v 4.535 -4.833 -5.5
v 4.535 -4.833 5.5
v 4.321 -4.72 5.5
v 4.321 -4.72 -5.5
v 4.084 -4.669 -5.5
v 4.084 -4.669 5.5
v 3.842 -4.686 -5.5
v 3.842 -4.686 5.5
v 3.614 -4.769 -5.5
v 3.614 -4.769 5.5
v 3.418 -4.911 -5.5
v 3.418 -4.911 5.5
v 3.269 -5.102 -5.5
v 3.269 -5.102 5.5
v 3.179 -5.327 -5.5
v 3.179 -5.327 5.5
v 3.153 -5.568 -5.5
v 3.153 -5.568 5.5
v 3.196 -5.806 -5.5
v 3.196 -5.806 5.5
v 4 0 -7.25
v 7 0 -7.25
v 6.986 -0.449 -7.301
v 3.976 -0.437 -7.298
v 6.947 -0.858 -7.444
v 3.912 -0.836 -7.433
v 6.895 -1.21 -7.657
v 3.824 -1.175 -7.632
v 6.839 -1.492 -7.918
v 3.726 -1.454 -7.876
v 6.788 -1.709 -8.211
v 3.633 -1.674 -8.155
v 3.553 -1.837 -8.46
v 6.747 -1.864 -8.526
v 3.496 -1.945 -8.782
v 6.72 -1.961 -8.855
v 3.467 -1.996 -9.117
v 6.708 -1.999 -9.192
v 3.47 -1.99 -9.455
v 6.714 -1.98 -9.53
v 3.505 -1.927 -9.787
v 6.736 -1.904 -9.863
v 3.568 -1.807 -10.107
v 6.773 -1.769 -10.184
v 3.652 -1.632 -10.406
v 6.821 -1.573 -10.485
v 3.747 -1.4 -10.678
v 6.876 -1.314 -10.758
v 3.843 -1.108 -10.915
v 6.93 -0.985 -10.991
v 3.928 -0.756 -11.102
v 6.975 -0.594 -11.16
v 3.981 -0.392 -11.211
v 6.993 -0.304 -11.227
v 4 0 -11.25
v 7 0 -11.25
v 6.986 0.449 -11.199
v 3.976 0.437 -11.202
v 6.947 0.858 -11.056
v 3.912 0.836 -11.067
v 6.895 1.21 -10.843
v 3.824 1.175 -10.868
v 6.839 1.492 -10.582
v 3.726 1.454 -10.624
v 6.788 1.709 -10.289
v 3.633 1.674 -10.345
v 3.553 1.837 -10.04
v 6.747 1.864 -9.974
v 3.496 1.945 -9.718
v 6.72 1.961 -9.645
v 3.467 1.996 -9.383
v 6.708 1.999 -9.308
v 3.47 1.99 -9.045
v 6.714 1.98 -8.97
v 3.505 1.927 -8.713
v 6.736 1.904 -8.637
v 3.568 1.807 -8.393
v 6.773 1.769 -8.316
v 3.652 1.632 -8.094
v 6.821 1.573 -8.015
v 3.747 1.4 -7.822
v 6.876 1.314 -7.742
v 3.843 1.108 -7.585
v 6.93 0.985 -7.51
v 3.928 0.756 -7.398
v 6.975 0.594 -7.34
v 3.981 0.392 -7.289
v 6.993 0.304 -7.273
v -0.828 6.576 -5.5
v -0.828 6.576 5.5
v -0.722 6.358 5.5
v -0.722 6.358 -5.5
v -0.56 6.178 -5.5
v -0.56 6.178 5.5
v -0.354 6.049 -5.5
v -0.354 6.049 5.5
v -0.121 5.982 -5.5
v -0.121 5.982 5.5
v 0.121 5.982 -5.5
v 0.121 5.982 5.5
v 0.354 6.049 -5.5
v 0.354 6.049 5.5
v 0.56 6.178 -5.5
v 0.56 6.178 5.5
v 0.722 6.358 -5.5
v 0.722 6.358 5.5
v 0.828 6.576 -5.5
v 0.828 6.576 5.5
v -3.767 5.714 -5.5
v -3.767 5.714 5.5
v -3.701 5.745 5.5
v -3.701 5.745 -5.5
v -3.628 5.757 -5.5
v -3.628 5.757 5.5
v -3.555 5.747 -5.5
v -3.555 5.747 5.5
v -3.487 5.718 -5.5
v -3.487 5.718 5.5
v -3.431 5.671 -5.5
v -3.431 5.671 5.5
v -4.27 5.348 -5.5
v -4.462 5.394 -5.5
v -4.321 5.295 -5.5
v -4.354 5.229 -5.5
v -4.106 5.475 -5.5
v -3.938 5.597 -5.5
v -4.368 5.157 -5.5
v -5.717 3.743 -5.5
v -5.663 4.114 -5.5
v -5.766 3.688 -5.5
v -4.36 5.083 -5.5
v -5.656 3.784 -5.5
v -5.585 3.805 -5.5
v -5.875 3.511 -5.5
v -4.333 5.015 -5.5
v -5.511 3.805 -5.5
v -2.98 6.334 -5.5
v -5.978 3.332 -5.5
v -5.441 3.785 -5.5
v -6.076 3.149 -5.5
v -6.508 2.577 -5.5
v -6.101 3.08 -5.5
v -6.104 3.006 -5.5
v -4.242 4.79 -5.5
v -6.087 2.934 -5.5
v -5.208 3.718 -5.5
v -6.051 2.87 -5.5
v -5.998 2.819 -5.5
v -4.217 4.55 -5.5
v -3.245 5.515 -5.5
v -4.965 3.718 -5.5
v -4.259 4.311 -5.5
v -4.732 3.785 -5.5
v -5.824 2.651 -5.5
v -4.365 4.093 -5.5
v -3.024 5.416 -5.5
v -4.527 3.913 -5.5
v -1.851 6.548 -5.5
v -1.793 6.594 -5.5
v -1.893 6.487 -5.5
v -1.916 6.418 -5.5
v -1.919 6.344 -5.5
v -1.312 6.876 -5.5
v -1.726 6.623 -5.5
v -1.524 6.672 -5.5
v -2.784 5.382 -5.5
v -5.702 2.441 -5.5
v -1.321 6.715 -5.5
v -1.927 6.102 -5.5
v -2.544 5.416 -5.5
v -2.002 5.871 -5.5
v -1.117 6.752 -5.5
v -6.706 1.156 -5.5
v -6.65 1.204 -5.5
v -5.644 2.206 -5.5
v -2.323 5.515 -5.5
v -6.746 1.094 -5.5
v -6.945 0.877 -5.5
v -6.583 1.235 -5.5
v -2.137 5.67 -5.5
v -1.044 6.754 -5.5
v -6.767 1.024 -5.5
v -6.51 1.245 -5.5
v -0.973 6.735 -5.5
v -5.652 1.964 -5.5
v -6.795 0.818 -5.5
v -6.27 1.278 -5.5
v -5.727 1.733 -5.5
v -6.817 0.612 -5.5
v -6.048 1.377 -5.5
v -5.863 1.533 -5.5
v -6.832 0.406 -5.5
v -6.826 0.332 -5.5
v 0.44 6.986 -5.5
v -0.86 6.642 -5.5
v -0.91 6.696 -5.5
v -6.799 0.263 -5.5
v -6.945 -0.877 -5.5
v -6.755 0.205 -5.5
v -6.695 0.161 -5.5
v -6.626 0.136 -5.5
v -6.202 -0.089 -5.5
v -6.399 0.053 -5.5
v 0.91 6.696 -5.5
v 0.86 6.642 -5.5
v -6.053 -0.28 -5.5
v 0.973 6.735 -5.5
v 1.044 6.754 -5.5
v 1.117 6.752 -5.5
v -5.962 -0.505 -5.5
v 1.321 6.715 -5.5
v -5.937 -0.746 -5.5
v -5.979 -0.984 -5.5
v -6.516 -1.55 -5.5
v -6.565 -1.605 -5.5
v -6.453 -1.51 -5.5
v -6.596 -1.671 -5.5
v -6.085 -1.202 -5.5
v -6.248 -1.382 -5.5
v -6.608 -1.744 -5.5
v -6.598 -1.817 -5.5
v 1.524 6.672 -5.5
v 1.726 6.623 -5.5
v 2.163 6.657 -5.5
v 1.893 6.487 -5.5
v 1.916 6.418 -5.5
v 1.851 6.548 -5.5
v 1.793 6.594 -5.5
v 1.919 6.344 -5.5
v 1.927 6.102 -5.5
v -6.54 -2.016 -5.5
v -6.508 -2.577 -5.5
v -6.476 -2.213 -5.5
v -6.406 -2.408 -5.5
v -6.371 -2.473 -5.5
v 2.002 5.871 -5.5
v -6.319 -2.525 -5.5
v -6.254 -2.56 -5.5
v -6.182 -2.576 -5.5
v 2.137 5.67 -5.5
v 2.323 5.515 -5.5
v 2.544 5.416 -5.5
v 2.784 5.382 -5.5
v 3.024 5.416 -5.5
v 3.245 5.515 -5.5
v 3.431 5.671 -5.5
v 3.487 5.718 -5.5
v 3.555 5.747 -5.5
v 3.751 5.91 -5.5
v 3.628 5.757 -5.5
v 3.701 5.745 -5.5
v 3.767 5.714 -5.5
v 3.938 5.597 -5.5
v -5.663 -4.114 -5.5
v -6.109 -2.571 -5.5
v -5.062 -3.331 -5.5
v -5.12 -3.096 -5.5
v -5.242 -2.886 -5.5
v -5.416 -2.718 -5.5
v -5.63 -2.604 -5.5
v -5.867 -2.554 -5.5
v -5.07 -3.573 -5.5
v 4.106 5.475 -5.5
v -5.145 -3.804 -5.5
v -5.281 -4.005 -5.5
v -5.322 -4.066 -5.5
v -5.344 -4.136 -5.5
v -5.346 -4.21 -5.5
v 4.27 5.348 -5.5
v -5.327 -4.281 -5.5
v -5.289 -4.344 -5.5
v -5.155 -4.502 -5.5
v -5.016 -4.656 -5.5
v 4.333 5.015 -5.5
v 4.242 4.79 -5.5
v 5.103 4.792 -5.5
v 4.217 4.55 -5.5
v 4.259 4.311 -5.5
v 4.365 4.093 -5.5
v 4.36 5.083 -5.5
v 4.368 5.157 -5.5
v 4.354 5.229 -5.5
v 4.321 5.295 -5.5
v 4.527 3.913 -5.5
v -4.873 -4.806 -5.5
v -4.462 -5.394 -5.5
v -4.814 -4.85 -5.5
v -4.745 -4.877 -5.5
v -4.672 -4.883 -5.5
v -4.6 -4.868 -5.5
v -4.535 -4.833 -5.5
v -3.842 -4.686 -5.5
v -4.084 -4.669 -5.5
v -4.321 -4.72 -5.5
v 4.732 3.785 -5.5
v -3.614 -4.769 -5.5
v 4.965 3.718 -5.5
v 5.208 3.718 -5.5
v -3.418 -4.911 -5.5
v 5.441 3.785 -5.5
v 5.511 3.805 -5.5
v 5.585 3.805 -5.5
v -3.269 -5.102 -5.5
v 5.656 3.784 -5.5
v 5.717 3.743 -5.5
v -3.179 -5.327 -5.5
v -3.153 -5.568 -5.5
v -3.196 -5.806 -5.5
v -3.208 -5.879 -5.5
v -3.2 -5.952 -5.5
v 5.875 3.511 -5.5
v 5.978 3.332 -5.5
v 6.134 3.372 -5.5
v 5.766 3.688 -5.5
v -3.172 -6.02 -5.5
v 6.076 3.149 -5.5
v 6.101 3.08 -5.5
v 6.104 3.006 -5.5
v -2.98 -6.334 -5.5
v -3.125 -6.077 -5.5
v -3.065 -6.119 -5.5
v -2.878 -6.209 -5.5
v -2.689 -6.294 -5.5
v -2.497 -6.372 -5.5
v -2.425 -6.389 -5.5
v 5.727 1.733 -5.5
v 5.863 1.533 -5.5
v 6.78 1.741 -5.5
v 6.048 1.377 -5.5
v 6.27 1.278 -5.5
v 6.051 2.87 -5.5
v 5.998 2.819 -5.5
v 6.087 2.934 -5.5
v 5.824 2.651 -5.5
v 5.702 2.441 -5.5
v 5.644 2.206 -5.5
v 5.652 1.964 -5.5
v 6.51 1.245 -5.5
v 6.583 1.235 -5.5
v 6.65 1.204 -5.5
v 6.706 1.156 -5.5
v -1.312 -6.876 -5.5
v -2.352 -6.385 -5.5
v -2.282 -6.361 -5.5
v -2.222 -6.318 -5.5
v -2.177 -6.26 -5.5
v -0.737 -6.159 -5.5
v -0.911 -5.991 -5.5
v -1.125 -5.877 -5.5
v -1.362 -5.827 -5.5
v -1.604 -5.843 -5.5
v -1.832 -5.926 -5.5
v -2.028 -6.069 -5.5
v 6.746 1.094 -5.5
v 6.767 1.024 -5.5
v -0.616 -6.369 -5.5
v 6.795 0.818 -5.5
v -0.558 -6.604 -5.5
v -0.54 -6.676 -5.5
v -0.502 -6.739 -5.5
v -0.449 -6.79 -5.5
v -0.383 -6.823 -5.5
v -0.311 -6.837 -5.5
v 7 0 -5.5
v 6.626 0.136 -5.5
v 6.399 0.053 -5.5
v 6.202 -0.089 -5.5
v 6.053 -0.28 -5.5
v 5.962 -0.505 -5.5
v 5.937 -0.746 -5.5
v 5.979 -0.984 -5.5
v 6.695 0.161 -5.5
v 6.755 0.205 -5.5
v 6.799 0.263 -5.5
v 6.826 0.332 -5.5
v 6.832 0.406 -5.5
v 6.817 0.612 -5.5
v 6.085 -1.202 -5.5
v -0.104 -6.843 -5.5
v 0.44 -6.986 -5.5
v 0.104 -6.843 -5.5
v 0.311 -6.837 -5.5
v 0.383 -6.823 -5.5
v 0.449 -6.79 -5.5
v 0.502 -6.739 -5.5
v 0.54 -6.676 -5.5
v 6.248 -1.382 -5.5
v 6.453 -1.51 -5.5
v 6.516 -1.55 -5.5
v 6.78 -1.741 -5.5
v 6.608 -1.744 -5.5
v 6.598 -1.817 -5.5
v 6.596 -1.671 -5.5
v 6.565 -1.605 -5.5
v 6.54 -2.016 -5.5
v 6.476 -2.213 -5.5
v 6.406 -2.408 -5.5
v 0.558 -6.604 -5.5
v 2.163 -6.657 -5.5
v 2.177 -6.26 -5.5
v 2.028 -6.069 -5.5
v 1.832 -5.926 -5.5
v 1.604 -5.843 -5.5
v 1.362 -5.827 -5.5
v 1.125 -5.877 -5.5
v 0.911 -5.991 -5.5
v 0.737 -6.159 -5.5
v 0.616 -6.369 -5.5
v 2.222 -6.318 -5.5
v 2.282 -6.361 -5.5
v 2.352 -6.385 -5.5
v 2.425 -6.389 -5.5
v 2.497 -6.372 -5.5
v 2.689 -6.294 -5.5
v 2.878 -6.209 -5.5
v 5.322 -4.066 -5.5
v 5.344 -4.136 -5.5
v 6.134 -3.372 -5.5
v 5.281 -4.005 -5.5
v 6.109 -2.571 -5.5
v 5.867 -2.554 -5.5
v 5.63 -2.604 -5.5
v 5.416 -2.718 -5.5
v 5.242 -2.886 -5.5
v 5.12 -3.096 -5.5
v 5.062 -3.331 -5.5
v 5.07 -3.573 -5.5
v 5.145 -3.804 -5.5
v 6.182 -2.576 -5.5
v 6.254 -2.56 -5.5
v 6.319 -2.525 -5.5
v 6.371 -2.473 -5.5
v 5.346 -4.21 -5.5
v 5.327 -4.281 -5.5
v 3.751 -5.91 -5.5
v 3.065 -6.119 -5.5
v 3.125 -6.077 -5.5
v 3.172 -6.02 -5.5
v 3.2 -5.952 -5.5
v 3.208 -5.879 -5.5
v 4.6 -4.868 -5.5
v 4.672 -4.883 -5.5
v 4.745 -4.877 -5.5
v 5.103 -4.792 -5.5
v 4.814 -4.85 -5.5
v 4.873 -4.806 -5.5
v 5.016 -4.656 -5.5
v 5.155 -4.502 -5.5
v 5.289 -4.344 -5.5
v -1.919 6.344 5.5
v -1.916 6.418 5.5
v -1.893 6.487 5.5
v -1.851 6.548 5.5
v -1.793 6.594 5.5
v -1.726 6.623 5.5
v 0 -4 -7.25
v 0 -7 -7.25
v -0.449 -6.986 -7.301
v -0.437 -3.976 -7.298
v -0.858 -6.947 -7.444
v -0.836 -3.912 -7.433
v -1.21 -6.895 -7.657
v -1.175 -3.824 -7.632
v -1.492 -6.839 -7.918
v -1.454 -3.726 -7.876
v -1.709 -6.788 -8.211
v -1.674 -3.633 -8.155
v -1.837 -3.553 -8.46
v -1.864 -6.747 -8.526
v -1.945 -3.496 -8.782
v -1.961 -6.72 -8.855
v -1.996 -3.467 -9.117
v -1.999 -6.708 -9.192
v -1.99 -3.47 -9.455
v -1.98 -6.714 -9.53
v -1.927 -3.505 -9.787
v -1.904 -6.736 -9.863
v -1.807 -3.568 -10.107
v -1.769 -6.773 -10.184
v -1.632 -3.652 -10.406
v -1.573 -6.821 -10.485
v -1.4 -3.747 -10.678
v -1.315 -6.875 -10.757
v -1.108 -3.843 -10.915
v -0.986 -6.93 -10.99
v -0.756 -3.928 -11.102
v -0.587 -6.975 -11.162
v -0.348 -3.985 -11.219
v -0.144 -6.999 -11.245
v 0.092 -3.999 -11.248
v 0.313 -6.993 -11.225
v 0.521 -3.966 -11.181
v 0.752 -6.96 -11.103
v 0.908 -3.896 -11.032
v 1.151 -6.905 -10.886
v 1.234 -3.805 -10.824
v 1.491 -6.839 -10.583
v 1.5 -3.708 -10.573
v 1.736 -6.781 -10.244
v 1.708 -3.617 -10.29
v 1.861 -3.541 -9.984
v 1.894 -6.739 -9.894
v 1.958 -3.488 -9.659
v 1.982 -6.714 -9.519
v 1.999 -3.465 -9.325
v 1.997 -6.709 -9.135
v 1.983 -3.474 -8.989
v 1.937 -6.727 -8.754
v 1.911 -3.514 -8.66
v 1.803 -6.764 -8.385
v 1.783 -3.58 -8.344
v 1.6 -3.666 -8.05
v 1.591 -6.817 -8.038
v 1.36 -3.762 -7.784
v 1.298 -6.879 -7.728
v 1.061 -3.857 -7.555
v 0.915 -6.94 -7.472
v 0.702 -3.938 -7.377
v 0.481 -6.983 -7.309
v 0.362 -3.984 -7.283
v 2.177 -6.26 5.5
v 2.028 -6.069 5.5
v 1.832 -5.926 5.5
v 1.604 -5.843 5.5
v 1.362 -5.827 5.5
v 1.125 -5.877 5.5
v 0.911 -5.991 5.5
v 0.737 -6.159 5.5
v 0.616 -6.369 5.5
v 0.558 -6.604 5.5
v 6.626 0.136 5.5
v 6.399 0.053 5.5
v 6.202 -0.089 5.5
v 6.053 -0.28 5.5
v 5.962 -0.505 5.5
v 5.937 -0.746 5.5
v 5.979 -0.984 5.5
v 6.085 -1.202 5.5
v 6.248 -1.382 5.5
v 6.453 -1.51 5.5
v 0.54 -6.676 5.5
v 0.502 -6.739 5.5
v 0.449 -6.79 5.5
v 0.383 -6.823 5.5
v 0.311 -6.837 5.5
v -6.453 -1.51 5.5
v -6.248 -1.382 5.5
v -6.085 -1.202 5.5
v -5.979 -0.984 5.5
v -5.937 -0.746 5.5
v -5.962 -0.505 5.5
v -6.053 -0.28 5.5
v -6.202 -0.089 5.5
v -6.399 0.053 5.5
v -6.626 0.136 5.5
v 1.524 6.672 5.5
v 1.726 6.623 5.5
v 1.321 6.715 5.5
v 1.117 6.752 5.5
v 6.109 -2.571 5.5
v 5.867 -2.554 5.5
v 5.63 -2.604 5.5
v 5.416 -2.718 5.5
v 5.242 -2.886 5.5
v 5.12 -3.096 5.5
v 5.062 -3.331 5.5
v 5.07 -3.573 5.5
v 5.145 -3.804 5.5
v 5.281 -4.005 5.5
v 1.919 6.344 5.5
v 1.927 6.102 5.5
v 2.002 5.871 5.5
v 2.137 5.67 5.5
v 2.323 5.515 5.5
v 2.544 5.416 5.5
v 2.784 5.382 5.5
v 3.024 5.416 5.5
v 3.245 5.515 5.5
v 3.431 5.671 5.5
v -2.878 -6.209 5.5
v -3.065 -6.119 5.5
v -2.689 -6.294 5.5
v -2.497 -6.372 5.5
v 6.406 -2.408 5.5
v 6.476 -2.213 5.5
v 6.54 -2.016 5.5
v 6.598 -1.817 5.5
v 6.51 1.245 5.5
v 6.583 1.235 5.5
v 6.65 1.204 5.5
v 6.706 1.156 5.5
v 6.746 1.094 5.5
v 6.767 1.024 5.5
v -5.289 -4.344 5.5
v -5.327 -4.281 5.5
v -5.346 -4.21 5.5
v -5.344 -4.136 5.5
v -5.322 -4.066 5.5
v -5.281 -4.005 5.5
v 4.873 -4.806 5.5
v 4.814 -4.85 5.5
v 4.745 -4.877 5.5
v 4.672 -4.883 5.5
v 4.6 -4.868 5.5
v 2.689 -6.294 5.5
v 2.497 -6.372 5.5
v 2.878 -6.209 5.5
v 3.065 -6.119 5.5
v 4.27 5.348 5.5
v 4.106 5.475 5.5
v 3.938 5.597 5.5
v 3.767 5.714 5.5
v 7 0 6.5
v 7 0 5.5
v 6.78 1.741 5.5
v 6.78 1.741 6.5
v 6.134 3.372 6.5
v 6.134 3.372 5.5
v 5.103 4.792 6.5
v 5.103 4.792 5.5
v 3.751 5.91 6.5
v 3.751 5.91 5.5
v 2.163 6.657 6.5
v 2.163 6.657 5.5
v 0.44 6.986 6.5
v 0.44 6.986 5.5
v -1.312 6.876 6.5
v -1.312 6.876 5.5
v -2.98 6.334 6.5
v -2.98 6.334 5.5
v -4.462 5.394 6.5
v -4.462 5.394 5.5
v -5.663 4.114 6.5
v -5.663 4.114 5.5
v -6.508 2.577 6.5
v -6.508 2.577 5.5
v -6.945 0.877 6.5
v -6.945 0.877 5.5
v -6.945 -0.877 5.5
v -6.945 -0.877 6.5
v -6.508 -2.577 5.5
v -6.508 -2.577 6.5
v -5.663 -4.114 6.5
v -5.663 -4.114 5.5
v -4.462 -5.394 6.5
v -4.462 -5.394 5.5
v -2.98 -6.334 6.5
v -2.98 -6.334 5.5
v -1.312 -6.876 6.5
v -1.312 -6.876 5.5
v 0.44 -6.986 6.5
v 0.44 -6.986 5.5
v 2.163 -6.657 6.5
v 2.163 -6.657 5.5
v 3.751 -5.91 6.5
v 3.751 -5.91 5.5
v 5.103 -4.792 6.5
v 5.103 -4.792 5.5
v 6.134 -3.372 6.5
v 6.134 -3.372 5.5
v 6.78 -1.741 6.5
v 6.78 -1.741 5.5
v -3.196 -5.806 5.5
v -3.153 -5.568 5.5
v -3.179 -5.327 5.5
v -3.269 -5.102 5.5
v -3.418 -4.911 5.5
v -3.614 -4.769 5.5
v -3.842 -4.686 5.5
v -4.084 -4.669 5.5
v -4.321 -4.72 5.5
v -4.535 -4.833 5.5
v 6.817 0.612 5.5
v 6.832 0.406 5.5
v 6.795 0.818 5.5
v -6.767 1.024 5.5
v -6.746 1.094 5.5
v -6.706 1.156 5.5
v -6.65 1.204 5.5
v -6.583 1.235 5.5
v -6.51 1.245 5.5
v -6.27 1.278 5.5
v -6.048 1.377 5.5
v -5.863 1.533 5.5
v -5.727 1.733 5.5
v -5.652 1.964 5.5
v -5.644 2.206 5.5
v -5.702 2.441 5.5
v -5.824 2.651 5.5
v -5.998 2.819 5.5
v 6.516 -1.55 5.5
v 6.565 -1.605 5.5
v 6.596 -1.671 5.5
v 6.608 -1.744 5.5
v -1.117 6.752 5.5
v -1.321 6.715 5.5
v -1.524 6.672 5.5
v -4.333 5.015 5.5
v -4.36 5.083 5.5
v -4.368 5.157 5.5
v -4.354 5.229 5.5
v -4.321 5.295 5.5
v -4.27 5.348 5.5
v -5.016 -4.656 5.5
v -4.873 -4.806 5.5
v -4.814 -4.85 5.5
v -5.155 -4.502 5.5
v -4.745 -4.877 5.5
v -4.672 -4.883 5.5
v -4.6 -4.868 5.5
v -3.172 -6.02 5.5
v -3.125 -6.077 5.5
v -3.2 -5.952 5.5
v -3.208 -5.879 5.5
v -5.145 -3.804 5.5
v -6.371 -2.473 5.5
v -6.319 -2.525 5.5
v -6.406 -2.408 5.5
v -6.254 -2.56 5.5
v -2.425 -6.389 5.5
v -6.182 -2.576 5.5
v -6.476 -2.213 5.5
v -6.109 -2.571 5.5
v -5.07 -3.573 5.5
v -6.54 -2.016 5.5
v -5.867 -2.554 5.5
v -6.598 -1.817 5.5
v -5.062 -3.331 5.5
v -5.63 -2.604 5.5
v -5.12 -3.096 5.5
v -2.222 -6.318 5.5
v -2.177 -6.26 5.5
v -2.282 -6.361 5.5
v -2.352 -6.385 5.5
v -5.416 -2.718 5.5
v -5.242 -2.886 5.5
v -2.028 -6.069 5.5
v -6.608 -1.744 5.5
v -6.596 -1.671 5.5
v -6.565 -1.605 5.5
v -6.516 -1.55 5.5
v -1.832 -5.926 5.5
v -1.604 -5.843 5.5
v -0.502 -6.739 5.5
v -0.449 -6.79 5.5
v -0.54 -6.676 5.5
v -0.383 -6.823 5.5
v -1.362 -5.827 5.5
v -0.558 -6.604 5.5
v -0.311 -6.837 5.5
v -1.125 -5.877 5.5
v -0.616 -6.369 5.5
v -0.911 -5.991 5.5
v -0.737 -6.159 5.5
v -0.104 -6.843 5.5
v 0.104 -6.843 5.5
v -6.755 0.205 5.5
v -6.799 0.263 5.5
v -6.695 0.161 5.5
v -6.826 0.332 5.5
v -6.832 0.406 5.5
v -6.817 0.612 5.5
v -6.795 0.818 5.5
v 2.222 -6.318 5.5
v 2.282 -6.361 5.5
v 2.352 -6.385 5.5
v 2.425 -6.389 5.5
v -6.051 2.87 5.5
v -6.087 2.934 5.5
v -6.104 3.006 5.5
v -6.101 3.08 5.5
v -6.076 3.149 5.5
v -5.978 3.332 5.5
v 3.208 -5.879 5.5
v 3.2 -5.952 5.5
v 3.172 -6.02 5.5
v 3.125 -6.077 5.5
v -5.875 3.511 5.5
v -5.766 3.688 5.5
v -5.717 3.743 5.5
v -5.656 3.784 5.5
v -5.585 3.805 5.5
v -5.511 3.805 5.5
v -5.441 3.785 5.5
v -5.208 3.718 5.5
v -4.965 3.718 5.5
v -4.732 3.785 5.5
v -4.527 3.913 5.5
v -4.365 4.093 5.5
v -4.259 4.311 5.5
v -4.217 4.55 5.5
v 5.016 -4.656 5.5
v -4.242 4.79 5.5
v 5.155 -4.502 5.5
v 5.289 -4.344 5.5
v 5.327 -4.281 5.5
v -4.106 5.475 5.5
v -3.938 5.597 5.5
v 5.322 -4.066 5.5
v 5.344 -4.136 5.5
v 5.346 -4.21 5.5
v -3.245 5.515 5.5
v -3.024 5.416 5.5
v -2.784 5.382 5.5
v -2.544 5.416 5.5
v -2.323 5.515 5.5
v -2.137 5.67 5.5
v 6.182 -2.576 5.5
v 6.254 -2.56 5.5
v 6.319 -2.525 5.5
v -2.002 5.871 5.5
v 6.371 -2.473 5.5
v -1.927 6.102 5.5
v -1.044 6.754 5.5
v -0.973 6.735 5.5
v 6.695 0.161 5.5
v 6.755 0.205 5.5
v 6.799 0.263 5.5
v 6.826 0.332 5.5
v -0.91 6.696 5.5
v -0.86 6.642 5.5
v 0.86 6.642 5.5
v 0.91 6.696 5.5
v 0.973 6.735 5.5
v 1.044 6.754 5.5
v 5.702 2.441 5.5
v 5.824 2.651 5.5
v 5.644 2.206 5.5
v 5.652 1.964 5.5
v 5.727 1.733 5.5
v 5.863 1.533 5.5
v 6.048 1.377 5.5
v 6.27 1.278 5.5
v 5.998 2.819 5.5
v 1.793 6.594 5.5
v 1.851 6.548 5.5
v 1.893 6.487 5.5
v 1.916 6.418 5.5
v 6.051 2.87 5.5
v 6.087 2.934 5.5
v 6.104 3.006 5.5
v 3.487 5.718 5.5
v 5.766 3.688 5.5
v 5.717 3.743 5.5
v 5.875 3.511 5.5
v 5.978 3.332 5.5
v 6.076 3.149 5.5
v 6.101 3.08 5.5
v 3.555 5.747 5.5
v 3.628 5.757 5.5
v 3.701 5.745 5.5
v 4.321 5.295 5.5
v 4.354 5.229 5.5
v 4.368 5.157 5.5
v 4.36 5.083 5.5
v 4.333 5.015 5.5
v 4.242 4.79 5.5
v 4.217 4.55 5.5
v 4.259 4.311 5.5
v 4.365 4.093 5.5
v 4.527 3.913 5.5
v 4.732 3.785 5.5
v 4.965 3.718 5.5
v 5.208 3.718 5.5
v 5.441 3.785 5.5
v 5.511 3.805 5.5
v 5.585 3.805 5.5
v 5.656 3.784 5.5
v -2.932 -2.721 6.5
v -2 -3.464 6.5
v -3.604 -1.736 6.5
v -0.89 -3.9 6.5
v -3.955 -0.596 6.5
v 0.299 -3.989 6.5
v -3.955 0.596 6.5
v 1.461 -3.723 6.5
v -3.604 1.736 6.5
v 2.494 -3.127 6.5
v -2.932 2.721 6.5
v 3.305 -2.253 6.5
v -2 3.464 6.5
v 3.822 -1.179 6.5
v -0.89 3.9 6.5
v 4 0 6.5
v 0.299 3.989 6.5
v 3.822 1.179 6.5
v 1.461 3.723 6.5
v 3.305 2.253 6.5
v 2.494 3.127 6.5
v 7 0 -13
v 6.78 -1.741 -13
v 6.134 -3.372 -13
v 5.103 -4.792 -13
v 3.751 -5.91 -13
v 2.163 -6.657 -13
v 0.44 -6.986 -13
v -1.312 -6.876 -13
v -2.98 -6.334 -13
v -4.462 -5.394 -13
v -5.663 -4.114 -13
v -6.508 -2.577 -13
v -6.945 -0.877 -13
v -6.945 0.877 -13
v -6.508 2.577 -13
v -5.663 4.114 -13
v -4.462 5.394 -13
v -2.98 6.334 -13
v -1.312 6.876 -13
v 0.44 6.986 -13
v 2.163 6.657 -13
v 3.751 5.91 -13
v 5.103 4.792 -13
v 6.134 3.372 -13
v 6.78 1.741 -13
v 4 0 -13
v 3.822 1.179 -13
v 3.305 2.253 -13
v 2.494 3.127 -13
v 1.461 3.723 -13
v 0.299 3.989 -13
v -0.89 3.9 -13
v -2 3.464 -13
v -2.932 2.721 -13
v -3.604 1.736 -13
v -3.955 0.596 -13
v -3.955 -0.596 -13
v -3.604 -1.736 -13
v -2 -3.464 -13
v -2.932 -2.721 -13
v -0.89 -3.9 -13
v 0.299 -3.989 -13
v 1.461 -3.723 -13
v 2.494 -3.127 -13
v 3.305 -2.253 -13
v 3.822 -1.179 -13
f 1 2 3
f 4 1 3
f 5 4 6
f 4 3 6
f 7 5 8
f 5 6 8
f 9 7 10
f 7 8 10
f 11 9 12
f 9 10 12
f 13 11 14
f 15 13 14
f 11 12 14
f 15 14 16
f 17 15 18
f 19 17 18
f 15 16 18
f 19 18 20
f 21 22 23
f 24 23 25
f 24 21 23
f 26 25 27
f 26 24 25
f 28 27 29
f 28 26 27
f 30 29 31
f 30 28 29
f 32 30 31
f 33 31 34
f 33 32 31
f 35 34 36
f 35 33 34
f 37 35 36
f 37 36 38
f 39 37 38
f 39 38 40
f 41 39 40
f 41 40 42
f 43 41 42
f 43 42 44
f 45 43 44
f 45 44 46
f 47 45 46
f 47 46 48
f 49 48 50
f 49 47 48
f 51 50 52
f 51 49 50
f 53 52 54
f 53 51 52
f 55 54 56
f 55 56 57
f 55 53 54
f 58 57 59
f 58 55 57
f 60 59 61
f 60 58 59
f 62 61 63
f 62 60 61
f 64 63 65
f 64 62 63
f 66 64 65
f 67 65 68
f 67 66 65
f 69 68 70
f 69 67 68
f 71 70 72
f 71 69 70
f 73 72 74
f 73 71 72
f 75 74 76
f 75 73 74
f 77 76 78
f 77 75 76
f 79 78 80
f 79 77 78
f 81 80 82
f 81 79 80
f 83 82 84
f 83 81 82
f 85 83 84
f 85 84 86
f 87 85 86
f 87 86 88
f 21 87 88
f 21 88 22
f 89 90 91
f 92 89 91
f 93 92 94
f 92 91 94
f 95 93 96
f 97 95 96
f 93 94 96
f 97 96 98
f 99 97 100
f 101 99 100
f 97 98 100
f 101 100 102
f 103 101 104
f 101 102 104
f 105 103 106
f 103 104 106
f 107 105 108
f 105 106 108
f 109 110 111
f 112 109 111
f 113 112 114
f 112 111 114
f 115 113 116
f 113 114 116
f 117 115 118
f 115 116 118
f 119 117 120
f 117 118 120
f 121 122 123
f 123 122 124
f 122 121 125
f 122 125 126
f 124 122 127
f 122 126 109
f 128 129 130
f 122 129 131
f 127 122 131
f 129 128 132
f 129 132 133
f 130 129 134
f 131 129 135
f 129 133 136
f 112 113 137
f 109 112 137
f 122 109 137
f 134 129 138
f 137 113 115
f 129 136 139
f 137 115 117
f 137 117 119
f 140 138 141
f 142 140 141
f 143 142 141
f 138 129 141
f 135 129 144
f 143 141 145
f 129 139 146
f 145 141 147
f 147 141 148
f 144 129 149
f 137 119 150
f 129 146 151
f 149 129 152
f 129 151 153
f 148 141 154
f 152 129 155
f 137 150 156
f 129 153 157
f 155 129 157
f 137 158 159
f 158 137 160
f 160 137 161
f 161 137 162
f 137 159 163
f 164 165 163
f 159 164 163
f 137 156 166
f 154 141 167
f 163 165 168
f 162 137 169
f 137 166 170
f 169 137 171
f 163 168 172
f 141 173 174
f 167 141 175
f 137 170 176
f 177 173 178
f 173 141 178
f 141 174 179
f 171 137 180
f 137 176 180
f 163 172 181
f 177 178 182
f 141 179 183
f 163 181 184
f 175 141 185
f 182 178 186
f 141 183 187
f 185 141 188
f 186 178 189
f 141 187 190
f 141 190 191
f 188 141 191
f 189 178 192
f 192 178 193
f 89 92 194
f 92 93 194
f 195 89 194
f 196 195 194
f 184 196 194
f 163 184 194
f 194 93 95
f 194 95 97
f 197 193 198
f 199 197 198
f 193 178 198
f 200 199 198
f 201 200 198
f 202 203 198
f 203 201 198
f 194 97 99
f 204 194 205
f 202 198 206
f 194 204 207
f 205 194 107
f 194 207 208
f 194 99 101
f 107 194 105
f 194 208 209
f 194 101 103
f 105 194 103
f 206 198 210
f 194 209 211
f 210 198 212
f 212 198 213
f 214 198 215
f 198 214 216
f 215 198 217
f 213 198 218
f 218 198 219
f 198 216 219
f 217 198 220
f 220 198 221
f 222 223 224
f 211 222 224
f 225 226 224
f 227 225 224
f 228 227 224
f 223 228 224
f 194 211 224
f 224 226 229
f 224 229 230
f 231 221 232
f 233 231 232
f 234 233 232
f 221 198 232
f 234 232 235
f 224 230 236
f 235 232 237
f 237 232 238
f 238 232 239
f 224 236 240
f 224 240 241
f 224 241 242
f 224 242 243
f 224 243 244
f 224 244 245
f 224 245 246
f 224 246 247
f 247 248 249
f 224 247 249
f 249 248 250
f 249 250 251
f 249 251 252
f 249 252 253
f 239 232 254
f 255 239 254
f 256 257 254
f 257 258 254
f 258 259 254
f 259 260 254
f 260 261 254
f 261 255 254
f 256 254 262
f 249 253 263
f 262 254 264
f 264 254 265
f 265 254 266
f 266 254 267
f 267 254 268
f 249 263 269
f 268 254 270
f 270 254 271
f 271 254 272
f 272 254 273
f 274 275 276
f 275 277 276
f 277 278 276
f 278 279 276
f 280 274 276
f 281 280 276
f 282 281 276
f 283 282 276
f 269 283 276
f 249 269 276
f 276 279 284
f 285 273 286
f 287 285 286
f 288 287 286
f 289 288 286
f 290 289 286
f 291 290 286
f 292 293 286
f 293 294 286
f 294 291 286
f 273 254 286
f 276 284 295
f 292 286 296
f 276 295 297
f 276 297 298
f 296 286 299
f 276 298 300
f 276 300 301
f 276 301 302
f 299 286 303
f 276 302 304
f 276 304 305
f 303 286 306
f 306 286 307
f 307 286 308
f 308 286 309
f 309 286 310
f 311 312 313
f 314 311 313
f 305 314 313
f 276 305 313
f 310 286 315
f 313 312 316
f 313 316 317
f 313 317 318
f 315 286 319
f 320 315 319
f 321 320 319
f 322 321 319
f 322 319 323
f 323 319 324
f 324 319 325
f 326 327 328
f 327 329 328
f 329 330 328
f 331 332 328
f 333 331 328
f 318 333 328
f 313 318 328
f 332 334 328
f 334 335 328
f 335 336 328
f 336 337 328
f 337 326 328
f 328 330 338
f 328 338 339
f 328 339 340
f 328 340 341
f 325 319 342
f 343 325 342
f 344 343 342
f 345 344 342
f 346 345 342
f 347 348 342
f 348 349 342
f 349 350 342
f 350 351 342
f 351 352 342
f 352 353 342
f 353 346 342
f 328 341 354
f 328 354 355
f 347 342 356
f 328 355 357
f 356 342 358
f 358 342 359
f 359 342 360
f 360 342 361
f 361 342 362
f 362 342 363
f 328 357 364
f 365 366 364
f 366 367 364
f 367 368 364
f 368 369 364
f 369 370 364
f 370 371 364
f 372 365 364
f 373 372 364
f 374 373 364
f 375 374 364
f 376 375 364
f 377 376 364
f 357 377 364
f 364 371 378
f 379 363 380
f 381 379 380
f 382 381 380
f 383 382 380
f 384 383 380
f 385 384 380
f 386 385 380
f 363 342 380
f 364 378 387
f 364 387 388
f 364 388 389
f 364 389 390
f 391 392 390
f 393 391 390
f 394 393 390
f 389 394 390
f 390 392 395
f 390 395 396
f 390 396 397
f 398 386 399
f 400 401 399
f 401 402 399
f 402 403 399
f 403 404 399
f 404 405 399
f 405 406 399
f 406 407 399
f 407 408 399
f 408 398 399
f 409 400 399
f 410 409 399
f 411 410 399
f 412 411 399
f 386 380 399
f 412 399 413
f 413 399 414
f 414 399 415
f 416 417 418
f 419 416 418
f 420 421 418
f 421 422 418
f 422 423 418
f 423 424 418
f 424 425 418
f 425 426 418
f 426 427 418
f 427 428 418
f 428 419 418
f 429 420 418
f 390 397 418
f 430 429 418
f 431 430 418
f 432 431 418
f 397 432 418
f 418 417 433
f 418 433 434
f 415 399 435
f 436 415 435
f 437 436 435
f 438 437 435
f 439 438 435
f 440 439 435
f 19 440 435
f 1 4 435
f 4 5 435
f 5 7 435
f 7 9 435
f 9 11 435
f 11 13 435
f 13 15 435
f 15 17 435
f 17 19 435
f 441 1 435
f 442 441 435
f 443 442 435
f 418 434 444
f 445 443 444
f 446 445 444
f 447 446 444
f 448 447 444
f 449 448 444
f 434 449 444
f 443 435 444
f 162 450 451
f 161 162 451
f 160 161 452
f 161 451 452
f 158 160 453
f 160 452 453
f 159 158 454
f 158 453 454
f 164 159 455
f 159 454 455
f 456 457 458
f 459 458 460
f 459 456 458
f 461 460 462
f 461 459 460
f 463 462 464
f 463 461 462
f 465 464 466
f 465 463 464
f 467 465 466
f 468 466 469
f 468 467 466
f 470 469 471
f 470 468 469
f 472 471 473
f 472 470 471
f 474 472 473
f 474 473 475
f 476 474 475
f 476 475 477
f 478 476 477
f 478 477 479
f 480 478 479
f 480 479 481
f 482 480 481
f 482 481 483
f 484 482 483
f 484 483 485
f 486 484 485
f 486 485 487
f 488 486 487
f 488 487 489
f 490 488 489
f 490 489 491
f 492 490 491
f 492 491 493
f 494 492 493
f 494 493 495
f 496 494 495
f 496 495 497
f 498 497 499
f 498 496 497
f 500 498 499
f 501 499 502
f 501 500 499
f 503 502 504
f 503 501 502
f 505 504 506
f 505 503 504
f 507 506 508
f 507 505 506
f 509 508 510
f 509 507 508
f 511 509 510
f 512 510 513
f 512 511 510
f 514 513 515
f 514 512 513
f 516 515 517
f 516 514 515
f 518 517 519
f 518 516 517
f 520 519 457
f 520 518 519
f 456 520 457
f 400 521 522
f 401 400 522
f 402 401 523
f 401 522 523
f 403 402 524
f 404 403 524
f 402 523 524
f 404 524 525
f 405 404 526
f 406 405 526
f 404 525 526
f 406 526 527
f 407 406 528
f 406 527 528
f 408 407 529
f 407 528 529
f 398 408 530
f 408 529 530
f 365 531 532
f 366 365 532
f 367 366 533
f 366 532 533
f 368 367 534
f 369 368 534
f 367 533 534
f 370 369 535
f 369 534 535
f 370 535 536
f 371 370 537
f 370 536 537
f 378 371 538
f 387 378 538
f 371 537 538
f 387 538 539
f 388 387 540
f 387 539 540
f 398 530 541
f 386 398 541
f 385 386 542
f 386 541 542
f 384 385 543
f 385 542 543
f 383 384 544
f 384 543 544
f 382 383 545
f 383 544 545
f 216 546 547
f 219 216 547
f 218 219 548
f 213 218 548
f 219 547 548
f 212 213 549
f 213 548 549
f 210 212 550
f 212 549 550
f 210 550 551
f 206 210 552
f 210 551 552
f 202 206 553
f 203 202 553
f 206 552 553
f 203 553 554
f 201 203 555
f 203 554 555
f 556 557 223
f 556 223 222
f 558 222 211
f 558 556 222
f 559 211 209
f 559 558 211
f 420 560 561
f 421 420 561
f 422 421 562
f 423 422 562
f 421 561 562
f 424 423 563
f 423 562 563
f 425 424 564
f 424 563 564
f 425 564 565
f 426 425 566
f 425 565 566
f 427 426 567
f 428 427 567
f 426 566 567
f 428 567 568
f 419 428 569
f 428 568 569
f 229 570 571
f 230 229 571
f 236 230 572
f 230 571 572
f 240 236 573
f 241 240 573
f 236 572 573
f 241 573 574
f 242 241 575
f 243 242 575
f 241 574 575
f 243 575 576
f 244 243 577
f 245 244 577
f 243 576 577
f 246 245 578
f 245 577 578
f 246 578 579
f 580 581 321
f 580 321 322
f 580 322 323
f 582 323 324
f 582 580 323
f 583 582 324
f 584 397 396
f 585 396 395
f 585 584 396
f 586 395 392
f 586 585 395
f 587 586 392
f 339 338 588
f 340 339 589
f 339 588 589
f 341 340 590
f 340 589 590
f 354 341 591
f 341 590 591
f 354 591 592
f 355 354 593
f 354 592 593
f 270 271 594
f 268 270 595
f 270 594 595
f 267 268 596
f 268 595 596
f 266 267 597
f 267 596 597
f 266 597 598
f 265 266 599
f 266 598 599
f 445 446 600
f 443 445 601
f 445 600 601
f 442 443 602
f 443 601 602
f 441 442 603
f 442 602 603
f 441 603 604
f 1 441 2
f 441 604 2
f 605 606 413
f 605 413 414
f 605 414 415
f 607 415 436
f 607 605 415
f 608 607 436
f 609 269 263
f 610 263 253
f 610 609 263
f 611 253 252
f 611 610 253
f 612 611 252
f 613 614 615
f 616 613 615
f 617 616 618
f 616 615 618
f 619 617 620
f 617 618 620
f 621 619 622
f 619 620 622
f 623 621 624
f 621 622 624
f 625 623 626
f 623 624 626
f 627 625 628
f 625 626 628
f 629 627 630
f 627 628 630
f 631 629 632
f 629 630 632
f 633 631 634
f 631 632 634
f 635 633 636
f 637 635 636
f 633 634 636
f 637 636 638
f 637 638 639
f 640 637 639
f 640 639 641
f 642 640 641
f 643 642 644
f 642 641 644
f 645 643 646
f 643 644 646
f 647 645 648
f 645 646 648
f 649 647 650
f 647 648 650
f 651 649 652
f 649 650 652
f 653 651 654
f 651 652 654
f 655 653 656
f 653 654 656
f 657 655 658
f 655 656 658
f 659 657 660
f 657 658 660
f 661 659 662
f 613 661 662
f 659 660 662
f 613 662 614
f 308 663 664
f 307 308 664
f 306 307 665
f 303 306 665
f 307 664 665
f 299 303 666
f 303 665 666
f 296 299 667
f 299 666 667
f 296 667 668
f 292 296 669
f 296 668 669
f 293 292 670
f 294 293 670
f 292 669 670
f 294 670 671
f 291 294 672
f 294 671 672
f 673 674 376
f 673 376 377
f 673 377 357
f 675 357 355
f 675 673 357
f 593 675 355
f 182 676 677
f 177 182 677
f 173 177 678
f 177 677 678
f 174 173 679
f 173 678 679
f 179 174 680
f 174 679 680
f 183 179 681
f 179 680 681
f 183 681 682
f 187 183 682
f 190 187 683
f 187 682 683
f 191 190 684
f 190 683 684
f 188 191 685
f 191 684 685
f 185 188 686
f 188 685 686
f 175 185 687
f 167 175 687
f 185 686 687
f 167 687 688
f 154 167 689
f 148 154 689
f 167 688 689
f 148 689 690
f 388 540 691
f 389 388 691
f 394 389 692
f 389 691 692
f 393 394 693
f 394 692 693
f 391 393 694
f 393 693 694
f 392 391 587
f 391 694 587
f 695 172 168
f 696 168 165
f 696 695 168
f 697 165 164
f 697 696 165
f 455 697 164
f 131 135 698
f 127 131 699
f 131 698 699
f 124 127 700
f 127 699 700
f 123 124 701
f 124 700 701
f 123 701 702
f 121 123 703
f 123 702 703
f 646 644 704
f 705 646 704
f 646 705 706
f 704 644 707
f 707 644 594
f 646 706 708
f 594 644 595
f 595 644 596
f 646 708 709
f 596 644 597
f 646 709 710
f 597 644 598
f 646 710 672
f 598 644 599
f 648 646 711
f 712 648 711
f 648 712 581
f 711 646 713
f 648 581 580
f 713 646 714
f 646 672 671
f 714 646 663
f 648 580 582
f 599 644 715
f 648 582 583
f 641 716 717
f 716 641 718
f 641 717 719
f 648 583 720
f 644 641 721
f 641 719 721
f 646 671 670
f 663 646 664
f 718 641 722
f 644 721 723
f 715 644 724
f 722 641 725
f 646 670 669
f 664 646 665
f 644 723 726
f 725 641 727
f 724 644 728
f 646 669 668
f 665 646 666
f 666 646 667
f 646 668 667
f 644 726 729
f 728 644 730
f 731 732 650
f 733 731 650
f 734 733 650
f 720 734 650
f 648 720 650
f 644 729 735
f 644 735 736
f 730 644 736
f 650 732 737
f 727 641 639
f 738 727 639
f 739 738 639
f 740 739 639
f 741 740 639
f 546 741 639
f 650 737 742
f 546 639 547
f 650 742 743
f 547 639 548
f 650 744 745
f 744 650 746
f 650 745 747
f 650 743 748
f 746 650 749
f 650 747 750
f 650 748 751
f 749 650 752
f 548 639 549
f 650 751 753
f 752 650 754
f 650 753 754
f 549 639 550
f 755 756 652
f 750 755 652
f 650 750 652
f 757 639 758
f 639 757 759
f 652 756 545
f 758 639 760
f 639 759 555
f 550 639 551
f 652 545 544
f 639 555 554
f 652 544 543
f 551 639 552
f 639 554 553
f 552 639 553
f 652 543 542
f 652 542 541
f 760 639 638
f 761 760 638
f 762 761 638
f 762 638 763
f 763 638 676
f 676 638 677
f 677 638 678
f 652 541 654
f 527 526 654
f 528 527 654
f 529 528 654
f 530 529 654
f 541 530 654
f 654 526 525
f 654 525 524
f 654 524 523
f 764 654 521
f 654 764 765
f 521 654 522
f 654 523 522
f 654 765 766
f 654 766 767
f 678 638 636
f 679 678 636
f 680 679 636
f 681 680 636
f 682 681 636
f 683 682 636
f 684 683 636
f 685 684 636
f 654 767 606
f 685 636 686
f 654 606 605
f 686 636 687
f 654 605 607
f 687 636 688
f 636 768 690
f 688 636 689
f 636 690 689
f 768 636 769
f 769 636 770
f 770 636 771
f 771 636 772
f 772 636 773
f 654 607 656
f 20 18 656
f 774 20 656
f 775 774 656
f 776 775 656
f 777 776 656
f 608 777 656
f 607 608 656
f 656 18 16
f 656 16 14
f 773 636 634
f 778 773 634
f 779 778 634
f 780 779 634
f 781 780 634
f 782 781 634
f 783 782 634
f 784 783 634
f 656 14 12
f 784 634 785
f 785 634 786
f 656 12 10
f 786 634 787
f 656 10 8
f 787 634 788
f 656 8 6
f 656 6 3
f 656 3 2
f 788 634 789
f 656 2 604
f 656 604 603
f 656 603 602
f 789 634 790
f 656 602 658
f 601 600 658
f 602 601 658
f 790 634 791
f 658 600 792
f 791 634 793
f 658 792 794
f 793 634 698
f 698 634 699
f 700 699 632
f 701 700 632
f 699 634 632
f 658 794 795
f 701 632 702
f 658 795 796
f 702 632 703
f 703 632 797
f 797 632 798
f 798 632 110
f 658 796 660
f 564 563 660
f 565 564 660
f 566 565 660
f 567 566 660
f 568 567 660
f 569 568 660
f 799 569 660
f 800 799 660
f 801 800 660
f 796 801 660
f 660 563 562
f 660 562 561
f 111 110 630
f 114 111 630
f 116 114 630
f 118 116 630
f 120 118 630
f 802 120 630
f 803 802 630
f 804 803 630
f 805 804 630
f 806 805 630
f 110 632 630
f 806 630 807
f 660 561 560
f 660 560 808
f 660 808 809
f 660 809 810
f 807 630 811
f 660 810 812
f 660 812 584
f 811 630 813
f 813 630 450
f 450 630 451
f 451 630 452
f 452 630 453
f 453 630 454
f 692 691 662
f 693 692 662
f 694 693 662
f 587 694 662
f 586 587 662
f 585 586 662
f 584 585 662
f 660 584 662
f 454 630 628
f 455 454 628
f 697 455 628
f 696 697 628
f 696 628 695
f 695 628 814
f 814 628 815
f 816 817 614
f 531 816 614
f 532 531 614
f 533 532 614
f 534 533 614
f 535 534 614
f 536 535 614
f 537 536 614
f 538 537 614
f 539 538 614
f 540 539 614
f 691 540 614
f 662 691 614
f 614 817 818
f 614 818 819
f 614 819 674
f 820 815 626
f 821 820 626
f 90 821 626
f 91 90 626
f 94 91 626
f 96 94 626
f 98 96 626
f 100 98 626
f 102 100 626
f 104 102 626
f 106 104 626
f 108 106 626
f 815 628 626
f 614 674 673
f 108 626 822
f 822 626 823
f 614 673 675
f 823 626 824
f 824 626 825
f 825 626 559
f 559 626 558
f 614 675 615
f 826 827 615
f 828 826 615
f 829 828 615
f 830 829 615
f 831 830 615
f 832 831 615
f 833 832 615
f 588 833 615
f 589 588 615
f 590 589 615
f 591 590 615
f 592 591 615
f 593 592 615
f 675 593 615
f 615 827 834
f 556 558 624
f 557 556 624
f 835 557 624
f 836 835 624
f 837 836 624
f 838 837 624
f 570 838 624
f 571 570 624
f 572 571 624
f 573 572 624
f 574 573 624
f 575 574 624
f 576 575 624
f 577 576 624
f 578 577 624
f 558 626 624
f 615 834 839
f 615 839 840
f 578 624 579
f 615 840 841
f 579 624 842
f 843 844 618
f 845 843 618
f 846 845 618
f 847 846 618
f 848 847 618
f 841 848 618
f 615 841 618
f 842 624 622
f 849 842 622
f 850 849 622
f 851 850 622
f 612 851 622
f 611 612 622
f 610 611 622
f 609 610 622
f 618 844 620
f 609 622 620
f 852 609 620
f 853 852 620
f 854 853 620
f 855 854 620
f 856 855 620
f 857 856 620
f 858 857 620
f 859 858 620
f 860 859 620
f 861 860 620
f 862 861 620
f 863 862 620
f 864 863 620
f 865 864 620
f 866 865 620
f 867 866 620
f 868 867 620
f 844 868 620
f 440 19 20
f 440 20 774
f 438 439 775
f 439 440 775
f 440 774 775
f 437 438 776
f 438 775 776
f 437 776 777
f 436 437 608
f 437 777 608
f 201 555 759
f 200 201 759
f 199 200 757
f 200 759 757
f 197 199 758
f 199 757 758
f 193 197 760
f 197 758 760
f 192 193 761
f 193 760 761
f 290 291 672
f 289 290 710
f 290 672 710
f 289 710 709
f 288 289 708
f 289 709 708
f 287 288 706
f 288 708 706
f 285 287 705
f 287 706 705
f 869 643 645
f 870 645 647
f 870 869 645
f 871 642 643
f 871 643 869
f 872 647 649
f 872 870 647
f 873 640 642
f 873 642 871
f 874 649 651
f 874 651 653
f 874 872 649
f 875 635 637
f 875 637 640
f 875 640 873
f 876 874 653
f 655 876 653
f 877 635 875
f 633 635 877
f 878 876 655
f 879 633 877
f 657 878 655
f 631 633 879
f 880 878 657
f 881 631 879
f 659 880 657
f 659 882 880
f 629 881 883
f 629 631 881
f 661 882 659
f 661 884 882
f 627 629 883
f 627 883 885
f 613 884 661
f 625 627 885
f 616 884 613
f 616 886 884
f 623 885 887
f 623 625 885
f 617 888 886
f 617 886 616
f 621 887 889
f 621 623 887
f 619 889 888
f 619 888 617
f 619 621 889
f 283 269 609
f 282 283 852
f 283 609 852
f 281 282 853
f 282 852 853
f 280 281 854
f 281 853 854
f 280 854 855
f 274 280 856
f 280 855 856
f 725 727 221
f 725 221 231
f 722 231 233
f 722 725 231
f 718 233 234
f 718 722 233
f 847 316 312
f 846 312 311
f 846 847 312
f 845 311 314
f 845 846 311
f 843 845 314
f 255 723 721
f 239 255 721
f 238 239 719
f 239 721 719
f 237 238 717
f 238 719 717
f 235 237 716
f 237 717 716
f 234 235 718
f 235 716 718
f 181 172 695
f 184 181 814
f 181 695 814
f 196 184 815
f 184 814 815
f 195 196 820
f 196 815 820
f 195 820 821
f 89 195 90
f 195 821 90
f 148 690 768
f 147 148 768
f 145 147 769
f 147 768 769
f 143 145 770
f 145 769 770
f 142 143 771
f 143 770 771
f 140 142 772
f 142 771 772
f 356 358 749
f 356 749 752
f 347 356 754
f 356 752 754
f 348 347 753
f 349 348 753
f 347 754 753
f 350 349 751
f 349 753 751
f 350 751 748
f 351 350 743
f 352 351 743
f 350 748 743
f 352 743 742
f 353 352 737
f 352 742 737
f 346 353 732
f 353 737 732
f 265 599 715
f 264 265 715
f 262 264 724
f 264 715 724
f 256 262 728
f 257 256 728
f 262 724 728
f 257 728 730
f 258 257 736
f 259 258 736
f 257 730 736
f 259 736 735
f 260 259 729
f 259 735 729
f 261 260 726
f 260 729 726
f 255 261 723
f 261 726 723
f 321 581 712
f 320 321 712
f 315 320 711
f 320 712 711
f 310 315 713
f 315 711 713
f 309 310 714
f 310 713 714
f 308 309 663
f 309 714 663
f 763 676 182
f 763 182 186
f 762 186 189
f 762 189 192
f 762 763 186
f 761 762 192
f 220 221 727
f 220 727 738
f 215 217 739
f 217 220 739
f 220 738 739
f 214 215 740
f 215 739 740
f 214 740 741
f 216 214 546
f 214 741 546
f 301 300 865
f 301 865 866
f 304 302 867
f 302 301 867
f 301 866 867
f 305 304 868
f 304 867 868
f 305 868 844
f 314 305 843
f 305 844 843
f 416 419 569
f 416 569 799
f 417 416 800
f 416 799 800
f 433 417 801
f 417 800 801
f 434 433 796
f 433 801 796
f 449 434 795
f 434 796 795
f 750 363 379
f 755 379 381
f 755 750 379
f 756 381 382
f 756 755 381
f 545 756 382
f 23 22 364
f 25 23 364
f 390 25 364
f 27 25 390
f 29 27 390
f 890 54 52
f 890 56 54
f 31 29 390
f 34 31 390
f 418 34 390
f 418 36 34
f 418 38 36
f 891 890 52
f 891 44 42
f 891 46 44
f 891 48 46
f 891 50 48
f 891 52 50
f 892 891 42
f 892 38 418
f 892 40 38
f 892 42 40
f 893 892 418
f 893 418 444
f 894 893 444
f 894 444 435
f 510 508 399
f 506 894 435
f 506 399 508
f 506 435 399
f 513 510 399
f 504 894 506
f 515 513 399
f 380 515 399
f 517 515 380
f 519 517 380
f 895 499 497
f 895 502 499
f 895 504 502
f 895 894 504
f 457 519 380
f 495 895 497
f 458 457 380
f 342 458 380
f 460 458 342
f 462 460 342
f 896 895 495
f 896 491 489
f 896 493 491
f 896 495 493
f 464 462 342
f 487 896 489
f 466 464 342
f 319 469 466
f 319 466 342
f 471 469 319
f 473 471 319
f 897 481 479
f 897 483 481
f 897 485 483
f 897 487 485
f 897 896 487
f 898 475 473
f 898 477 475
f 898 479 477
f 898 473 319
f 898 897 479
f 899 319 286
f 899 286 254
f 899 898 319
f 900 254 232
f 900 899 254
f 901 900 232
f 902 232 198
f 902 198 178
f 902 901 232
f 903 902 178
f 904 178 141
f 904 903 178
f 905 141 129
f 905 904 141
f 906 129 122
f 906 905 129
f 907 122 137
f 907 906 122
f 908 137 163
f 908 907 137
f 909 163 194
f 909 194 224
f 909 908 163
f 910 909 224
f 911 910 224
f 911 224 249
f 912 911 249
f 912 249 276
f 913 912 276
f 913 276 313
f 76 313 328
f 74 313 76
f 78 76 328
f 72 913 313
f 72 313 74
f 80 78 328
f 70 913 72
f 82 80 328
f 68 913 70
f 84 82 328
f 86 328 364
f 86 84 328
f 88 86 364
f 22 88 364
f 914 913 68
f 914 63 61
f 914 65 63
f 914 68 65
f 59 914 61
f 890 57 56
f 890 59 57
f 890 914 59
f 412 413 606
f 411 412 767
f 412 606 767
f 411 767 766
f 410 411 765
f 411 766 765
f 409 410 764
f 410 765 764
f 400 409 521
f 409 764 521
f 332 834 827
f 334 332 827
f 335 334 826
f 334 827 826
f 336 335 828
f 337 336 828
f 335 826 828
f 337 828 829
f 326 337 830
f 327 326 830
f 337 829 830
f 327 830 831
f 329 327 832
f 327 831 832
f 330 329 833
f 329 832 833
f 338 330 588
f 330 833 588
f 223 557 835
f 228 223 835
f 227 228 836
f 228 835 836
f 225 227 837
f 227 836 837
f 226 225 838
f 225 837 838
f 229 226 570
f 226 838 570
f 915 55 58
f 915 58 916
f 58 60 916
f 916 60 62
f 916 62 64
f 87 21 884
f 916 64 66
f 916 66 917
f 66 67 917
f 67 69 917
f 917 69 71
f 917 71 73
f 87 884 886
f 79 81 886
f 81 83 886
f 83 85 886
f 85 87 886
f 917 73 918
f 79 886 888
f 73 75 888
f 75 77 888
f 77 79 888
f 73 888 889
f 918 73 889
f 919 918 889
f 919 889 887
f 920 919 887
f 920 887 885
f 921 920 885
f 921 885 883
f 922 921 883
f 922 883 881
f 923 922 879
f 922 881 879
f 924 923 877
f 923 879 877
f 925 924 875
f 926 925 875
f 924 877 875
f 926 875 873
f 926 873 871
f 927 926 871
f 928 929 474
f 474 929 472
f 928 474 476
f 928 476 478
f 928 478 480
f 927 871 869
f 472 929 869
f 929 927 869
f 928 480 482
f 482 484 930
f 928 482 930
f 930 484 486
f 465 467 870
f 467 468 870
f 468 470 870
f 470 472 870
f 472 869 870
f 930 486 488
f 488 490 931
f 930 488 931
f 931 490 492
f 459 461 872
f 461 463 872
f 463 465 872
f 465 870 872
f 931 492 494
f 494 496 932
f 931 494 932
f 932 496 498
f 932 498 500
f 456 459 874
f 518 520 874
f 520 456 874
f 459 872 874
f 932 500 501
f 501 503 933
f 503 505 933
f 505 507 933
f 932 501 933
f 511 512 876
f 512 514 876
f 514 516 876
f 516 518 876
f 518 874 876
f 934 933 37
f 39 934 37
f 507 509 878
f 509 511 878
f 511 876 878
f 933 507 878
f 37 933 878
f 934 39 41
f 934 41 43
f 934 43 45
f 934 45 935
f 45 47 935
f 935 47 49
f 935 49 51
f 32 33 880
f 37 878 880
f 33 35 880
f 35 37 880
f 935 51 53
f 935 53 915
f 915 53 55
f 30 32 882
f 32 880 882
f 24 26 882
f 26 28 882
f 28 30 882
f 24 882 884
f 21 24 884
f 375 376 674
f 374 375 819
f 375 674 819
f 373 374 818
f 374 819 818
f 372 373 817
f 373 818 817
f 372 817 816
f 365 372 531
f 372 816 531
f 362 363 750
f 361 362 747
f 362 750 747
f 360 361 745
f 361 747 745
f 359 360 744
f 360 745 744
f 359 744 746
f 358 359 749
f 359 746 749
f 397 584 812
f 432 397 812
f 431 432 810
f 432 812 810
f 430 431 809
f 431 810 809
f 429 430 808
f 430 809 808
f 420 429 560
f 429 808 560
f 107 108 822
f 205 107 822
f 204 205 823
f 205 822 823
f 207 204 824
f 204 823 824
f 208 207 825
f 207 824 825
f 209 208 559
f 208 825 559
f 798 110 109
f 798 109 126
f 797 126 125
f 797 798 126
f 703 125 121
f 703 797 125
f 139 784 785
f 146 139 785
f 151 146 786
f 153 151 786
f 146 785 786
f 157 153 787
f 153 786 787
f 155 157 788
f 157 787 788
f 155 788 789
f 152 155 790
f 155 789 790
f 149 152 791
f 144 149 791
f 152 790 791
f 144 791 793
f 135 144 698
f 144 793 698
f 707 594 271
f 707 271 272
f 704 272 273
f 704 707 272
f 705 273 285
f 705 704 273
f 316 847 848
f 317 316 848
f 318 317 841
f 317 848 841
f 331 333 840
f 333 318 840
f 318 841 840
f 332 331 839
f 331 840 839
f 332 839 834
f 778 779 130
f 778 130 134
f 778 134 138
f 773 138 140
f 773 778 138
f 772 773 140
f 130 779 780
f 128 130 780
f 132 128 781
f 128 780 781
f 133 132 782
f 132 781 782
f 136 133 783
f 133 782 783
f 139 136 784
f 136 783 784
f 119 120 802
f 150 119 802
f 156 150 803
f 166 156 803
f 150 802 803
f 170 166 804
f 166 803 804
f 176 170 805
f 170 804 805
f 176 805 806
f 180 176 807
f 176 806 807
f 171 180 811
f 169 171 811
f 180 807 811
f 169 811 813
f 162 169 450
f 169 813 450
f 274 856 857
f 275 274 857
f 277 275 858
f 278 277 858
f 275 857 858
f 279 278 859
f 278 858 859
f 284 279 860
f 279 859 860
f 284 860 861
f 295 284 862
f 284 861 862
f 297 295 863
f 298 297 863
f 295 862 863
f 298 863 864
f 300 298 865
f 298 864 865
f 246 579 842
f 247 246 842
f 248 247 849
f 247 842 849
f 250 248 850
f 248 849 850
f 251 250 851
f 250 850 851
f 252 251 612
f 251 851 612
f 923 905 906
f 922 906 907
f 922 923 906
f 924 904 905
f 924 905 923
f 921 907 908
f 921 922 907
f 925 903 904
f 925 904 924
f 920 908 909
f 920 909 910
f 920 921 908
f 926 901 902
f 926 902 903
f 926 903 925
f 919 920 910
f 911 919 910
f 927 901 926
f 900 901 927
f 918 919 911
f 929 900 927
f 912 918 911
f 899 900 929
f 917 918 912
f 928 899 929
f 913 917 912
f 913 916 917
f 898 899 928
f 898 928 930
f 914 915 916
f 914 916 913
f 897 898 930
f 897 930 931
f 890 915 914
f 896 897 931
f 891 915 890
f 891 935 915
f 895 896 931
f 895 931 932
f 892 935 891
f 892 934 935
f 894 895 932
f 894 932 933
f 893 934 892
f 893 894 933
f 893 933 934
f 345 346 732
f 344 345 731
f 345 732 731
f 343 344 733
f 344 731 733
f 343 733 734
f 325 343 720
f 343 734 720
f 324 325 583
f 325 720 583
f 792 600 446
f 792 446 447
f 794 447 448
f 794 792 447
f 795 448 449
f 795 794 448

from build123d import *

# Parameters (mm, degrees)
SKETCH1_R           = 6.843972439
BOSS_EXTRUDE1_DEPTH = 5.5
CUT_EXTRUDE1_DEPTH  = 15.65195951
CIRPATTERN1_COUNT   = 15
SKETCH3_R           = 7
BOSS_EXTRUDE2_DEPTH = 1
BOSS_EXTRUDE3_START = 7.5
SKETCH4_R           = 7
BOSS_EXTRUDE3_DEPTH = 7.5
SKETCH5_R           = 4
CUT_EXTRUDE2_DEPTH  = 22.868927729
SKETCH6_R           = 2
CUT_EXTRUDE3_DEPTH  = 17.340134638
CIRPATTERN2_COUNT   = 2
CIRPATTERN2_ANGLE   = 90


with BuildPart() as part:
    # Sketch1 → Boss-Extrude1 (new, symmetric)
    with BuildSketch(Plane.XY):
        Circle(SKETCH1_R)
    extrude(amount=BOSS_EXTRUDE1_DEPTH, both=True)

    # Sketch2 → Cut-Extrude1 (cut, through all)
    with BuildSketch(Plane.XY.offset(5.5)):
        with BuildLine():
            ThreePointArc((-1.117417151, 6.752135785), (-0.9397987, 6.71772722), (-0.827629371, 6.57577545))
            ThreePointArc((-0.827629371, 6.57577545), (0, 5.973972439), (0.827629371, 6.57577545))
            ThreePointArc((0.827629371, 6.57577545), (0.9397987, 6.71772722), (1.117417151, 6.752135785))
            ThreePointArc((1.117417151, 6.752135785), (0, 6.843972439), (-1.117417151, 6.752135785))
        make_face()
    cut_extrude1 = extrude(amount=-CUT_EXTRUDE1_DEPTH, mode=Mode.SUBTRACT)

    # CirPattern1: Cut-Extrude1 ×15 about axis
    cirpattern1_axis = Axis((0, 0, 0), (0, 0, 1))
    for i in range(1, CIRPATTERN1_COUNT):
        add(cut_extrude1.rotate(cirpattern1_axis, i * 360 / CIRPATTERN1_COUNT), mode=Mode.SUBTRACT)

    # Sketch3 → Boss-Extrude2 (add)
    with BuildSketch(Plane.XY.offset(5.5)):
        Circle(SKETCH3_R)
    extrude(amount=BOSS_EXTRUDE2_DEPTH)

    # Sketch4 → Boss-Extrude3 (add)
    with BuildSketch(Plane(origin=(0, 0, -5.5), x_dir=(-1, 0, 0), z_dir=(0, 0, -1)).offset(BOSS_EXTRUDE3_START)):
        with Locations(Location((0, 0, 0), (0, 0, 180))):
            Circle(SKETCH4_R)
    extrude(amount=-BOSS_EXTRUDE3_DEPTH)

    # Sketch5 → Cut-Extrude2 (cut, through all)
    with BuildSketch(Plane.XY.offset(6.5)):
        Circle(SKETCH5_R)
    extrude(amount=-CUT_EXTRUDE2_DEPTH, mode=Mode.SUBTRACT)

    # Sketch6 → Cut-Extrude3 (cut, through all)
    with BuildSketch(Plane(origin=(0, 0, 0), x_dir=(0, 0, -1), z_dir=(1, 0, 0))):
        with Locations(Location((9.25, 0, 0), (0, 0, 180))):
            Circle(SKETCH6_R)
    cut_extrude3 = extrude(amount=CUT_EXTRUDE3_DEPTH, mode=Mode.SUBTRACT)

    # CirPattern2: Cut-Extrude3 ×2 about axis
    cirpattern2_axis = Axis((0, 0, -13), (0, 0, -1))
    for i in range(1, CIRPATTERN2_COUNT):
        add(cut_extrude3.rotate(cirpattern2_axis, i * CIRPATTERN2_ANGLE / (CIRPATTERN2_COUNT - 1)), mode=Mode.SUBTRACT)


solid = part.part
